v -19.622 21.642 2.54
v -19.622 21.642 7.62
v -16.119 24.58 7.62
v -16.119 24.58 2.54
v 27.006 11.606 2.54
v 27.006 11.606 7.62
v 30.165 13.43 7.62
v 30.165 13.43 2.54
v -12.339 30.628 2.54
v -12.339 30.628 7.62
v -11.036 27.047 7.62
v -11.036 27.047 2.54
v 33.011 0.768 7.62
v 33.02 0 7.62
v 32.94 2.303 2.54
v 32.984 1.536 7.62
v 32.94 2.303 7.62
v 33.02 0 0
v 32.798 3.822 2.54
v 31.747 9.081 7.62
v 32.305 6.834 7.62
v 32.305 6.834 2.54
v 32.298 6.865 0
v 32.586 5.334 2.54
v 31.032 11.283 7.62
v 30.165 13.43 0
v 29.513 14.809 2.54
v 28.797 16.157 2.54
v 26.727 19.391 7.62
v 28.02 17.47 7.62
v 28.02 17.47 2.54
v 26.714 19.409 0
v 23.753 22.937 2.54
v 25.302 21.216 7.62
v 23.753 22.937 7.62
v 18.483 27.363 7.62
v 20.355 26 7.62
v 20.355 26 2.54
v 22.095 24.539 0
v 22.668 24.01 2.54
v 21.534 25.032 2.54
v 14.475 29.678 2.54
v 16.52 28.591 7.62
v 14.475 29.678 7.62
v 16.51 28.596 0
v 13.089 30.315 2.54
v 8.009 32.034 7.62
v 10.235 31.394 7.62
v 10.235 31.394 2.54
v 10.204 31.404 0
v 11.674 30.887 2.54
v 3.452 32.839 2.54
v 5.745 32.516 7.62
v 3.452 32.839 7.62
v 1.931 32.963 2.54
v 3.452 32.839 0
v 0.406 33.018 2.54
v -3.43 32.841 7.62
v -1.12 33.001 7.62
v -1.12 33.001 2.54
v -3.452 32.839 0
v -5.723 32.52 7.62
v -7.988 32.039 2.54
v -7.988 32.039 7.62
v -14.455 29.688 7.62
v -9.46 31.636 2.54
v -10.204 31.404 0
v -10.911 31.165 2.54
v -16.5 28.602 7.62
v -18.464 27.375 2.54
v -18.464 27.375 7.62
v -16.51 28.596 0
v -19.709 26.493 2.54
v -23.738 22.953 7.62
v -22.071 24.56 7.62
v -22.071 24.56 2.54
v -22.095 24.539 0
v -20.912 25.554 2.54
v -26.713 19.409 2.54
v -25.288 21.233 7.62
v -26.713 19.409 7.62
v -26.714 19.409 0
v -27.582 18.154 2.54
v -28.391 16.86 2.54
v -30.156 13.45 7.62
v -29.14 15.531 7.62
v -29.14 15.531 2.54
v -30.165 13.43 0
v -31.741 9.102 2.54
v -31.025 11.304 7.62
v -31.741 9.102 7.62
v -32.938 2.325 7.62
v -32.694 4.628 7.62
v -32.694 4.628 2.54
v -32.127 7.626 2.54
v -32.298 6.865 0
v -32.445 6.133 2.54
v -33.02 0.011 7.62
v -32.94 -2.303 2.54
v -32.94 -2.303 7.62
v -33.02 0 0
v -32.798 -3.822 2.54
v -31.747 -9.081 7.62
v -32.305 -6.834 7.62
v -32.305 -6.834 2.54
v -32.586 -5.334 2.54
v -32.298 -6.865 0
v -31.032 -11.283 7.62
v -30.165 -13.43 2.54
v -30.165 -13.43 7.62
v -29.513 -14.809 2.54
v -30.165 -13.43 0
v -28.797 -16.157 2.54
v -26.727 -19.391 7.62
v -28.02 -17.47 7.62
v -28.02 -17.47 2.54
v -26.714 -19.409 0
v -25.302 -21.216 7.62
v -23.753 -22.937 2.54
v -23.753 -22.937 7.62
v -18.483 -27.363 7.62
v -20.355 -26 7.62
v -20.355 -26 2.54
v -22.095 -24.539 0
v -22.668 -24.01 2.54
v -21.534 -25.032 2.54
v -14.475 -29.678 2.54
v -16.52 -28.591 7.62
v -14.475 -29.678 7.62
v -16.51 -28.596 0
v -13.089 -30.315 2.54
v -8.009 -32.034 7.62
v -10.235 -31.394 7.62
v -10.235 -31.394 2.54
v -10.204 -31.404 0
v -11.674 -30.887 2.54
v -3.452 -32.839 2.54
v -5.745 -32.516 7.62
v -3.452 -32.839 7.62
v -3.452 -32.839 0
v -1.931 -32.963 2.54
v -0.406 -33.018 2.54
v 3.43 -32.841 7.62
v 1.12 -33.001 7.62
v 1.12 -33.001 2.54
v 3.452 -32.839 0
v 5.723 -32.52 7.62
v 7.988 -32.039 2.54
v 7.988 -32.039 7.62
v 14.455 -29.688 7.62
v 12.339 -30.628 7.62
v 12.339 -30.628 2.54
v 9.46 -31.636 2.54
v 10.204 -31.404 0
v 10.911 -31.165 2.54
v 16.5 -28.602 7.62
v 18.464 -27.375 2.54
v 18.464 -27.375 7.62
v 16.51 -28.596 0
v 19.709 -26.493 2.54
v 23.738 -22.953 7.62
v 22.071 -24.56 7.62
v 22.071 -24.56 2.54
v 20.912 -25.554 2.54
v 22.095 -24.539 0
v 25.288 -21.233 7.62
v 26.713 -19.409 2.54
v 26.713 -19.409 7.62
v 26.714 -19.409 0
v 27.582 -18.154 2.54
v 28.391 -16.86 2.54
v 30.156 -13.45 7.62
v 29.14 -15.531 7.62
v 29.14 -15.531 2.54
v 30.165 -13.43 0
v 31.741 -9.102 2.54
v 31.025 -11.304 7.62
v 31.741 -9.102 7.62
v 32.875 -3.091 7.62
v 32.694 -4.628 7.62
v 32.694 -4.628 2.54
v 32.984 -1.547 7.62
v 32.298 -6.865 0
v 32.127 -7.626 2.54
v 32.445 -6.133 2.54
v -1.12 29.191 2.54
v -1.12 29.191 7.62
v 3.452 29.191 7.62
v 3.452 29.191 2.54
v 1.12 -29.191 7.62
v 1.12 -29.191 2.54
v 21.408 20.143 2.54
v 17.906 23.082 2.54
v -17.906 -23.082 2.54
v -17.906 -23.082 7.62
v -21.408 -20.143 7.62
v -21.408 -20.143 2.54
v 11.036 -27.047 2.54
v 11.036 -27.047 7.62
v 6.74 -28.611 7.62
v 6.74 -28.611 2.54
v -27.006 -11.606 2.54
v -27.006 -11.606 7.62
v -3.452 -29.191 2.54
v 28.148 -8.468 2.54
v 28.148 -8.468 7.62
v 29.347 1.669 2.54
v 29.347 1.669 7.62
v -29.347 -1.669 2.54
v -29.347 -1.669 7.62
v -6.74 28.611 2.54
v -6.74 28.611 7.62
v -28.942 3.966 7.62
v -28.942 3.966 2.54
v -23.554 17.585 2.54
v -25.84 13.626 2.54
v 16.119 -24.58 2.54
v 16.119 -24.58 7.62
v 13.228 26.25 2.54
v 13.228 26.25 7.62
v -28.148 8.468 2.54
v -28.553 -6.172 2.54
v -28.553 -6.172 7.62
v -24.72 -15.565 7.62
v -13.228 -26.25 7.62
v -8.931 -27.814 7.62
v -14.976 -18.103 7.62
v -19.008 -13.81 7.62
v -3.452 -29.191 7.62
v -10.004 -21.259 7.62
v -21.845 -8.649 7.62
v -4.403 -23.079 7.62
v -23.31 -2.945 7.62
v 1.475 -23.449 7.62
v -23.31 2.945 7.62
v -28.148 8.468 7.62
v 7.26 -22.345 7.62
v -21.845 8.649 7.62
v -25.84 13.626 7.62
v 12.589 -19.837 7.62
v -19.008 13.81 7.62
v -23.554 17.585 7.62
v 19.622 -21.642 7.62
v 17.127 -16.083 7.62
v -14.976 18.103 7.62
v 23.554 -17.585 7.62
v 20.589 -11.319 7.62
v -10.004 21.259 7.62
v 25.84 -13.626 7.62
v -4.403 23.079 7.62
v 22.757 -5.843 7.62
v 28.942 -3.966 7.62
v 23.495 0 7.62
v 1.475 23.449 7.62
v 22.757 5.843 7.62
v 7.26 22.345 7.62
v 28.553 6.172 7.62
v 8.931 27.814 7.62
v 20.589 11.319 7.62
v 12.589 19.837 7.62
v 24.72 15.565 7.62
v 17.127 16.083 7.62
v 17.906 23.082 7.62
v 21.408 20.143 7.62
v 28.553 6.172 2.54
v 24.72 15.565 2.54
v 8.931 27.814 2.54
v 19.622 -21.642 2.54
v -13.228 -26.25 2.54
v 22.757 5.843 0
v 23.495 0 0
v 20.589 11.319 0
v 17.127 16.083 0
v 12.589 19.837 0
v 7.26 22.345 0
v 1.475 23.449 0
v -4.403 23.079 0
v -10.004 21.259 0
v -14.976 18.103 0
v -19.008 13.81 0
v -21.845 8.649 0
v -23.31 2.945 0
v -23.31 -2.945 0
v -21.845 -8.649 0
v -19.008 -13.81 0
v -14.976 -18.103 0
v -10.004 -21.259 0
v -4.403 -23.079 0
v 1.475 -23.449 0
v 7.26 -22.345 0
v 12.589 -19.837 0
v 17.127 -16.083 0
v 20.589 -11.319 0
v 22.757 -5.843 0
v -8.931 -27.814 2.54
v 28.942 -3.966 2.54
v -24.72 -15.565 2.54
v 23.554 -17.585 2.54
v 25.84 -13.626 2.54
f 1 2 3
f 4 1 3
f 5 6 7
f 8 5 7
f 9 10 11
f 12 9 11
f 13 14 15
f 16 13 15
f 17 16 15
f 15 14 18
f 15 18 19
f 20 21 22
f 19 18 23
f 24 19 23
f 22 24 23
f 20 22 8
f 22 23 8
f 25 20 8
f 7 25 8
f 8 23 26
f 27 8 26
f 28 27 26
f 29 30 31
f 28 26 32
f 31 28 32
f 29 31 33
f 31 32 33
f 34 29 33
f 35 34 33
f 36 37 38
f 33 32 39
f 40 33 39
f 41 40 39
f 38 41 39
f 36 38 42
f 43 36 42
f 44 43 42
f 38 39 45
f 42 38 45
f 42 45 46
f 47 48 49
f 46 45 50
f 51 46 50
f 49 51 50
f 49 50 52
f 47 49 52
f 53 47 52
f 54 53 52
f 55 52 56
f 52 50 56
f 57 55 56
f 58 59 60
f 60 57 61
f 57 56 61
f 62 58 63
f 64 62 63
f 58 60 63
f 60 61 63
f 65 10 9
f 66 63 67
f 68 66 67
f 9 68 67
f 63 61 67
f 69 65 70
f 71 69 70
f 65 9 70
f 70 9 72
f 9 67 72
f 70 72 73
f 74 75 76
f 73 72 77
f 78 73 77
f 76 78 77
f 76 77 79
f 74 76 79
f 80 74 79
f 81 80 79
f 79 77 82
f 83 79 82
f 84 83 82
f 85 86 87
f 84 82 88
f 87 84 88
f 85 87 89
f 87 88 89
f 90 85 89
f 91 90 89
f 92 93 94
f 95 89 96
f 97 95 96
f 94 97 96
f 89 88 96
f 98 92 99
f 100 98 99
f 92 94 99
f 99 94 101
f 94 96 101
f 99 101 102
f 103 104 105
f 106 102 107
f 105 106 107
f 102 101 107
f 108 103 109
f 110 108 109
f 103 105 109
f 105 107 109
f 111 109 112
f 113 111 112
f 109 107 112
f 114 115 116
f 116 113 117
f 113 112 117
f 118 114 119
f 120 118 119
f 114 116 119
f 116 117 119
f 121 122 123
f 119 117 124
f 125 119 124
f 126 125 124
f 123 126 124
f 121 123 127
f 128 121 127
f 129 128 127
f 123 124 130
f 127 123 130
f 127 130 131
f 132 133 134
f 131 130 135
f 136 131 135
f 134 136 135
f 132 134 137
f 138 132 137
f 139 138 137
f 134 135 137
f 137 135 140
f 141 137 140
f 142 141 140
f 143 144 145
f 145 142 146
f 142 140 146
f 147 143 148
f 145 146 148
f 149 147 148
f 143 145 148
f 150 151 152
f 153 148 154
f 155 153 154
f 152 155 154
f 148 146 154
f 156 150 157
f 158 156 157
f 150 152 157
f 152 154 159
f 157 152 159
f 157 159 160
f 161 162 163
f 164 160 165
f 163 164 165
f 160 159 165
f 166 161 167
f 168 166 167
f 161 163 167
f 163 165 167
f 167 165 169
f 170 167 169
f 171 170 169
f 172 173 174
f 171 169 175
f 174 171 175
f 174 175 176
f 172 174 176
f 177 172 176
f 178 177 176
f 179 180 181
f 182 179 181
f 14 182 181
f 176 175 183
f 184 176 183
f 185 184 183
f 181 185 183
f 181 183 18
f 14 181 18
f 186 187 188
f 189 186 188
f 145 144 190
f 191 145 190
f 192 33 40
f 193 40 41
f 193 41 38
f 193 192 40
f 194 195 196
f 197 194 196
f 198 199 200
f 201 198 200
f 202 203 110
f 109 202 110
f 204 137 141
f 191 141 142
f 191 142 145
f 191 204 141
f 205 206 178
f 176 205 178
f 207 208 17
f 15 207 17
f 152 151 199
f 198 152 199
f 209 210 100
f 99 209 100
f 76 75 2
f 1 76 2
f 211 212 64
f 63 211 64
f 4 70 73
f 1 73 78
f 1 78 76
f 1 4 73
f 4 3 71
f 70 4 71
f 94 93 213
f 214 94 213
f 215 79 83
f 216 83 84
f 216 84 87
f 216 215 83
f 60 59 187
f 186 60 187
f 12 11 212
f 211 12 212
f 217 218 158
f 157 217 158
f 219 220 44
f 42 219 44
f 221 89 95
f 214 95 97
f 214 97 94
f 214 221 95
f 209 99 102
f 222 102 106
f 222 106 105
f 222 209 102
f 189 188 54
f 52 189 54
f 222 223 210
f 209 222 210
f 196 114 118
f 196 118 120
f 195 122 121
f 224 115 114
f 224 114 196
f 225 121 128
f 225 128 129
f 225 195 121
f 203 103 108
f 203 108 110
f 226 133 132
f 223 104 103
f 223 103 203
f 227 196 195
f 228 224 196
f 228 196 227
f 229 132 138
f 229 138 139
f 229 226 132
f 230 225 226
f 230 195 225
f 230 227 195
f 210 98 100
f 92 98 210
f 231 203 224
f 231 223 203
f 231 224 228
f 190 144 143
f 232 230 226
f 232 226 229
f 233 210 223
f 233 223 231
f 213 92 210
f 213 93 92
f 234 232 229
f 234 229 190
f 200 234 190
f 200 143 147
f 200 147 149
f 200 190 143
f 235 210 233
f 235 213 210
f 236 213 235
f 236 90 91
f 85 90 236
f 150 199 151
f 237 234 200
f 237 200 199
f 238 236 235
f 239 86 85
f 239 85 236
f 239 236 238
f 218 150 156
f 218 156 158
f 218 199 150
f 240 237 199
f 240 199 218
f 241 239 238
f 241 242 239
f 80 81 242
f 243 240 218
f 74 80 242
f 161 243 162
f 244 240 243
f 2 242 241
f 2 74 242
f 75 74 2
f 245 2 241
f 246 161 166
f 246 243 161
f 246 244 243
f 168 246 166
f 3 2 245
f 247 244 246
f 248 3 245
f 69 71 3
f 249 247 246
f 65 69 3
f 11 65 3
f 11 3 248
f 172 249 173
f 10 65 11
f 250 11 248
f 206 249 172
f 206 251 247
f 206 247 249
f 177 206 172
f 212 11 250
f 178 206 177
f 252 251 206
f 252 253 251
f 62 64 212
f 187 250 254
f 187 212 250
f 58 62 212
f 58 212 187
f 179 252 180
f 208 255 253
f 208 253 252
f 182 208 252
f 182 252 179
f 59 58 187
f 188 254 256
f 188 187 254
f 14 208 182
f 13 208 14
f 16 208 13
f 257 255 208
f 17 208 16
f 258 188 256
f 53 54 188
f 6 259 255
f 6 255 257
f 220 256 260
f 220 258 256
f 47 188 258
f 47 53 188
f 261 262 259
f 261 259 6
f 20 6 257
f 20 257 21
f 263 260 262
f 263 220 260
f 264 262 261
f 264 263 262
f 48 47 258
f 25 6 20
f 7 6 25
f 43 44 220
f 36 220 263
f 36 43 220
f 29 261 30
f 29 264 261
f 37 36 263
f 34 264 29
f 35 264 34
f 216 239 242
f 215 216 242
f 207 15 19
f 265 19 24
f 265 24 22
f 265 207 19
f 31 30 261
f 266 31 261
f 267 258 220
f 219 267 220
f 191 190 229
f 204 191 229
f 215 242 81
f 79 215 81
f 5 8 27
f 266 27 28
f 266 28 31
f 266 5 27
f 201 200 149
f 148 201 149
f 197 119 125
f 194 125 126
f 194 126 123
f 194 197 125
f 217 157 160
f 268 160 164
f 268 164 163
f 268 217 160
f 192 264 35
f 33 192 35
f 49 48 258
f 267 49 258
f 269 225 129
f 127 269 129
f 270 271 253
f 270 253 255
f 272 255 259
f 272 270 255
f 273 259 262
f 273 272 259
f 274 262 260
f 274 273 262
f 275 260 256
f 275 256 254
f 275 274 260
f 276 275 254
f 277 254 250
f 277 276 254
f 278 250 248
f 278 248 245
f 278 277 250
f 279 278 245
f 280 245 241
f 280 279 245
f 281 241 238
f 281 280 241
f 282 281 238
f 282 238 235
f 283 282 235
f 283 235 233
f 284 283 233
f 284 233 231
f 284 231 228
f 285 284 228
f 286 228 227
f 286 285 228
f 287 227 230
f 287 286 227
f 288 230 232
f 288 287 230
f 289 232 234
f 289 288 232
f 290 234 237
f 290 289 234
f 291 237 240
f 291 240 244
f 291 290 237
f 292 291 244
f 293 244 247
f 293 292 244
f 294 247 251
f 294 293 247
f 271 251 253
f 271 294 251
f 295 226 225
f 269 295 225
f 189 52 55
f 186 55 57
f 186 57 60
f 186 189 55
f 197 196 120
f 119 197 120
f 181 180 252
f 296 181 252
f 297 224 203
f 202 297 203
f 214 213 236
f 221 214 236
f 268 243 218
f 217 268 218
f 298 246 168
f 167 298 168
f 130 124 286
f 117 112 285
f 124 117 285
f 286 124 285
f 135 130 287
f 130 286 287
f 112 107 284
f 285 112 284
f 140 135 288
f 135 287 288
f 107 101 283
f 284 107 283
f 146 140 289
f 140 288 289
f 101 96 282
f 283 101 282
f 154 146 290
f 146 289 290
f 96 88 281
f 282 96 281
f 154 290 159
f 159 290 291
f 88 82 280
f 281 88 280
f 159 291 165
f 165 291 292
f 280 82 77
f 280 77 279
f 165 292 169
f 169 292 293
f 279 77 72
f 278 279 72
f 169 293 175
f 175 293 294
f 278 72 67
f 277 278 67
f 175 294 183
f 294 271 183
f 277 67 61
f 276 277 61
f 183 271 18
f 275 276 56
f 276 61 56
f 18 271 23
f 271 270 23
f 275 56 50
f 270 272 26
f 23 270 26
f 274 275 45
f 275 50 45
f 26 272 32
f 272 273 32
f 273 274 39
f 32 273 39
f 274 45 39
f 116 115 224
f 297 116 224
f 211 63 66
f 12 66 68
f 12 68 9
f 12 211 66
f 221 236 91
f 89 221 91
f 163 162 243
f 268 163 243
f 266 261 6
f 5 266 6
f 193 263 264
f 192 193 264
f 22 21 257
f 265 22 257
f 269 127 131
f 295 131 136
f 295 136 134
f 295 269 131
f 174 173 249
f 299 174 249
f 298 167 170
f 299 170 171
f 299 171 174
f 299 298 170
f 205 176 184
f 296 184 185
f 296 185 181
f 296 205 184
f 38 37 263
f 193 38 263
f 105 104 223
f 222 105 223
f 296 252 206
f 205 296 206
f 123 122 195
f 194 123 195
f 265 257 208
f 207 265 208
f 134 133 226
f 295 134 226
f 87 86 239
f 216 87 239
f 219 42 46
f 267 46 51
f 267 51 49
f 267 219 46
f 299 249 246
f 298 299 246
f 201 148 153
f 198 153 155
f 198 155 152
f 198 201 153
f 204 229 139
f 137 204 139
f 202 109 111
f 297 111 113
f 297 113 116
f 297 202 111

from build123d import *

# Parameters (mm, degrees)
F0_R            = 33.02
F0_R_2          = 23.495
F1_DEPTH        = 7.62
F3_DEPTH        = 5.08
F3_COPIES_COUNT = 18


# Not quite as in the source:
# - a pattern or mirror of a feature is missing from the dataset's text; its kind, count and spacing are read off the source's solid


with BuildPart() as f1:
    # F0 (on Top) → F1 (new body)
    with BuildSketch(Plane.XY):
        Circle(F0_R)
        Circle(F0_R_2, mode=Mode.SUBTRACT)
    extrude(amount=F1_DEPTH)

    # F2 (on face) → F3 (cut)
    with BuildSketch(Plane.XY.offset(7.62)):
        with BuildLine():
            Line((-3.4519625326, -29.1909987132), (-3.4519625326, -32.8390675061))
            ThreePointArc((-3.4519625326, -32.8390675061), (-1.1687703181, -32.9993087192), (1.1200374674, -33.0009987132))
            Line((1.1200374674, -33.0009987132), (1.1200374674, -29.1909987132))
            Line((1.1200374674, -29.1909987132), (-3.4519625326, -29.1909987132))
        make_face()
    f3 = extrude(amount=-F3_DEPTH, mode=Mode.SUBTRACT)

    # F3_copies: F3 ×18 about axis
    f3_copies_axis = Axis((0, 0, 0), (0, 0, 1))
    for i in range(1, F3_COPIES_COUNT):
        add(f3.rotate(f3_copies_axis, i * 360 / F3_COPIES_COUNT), mode=Mode.SUBTRACT)


solid = f1.part
